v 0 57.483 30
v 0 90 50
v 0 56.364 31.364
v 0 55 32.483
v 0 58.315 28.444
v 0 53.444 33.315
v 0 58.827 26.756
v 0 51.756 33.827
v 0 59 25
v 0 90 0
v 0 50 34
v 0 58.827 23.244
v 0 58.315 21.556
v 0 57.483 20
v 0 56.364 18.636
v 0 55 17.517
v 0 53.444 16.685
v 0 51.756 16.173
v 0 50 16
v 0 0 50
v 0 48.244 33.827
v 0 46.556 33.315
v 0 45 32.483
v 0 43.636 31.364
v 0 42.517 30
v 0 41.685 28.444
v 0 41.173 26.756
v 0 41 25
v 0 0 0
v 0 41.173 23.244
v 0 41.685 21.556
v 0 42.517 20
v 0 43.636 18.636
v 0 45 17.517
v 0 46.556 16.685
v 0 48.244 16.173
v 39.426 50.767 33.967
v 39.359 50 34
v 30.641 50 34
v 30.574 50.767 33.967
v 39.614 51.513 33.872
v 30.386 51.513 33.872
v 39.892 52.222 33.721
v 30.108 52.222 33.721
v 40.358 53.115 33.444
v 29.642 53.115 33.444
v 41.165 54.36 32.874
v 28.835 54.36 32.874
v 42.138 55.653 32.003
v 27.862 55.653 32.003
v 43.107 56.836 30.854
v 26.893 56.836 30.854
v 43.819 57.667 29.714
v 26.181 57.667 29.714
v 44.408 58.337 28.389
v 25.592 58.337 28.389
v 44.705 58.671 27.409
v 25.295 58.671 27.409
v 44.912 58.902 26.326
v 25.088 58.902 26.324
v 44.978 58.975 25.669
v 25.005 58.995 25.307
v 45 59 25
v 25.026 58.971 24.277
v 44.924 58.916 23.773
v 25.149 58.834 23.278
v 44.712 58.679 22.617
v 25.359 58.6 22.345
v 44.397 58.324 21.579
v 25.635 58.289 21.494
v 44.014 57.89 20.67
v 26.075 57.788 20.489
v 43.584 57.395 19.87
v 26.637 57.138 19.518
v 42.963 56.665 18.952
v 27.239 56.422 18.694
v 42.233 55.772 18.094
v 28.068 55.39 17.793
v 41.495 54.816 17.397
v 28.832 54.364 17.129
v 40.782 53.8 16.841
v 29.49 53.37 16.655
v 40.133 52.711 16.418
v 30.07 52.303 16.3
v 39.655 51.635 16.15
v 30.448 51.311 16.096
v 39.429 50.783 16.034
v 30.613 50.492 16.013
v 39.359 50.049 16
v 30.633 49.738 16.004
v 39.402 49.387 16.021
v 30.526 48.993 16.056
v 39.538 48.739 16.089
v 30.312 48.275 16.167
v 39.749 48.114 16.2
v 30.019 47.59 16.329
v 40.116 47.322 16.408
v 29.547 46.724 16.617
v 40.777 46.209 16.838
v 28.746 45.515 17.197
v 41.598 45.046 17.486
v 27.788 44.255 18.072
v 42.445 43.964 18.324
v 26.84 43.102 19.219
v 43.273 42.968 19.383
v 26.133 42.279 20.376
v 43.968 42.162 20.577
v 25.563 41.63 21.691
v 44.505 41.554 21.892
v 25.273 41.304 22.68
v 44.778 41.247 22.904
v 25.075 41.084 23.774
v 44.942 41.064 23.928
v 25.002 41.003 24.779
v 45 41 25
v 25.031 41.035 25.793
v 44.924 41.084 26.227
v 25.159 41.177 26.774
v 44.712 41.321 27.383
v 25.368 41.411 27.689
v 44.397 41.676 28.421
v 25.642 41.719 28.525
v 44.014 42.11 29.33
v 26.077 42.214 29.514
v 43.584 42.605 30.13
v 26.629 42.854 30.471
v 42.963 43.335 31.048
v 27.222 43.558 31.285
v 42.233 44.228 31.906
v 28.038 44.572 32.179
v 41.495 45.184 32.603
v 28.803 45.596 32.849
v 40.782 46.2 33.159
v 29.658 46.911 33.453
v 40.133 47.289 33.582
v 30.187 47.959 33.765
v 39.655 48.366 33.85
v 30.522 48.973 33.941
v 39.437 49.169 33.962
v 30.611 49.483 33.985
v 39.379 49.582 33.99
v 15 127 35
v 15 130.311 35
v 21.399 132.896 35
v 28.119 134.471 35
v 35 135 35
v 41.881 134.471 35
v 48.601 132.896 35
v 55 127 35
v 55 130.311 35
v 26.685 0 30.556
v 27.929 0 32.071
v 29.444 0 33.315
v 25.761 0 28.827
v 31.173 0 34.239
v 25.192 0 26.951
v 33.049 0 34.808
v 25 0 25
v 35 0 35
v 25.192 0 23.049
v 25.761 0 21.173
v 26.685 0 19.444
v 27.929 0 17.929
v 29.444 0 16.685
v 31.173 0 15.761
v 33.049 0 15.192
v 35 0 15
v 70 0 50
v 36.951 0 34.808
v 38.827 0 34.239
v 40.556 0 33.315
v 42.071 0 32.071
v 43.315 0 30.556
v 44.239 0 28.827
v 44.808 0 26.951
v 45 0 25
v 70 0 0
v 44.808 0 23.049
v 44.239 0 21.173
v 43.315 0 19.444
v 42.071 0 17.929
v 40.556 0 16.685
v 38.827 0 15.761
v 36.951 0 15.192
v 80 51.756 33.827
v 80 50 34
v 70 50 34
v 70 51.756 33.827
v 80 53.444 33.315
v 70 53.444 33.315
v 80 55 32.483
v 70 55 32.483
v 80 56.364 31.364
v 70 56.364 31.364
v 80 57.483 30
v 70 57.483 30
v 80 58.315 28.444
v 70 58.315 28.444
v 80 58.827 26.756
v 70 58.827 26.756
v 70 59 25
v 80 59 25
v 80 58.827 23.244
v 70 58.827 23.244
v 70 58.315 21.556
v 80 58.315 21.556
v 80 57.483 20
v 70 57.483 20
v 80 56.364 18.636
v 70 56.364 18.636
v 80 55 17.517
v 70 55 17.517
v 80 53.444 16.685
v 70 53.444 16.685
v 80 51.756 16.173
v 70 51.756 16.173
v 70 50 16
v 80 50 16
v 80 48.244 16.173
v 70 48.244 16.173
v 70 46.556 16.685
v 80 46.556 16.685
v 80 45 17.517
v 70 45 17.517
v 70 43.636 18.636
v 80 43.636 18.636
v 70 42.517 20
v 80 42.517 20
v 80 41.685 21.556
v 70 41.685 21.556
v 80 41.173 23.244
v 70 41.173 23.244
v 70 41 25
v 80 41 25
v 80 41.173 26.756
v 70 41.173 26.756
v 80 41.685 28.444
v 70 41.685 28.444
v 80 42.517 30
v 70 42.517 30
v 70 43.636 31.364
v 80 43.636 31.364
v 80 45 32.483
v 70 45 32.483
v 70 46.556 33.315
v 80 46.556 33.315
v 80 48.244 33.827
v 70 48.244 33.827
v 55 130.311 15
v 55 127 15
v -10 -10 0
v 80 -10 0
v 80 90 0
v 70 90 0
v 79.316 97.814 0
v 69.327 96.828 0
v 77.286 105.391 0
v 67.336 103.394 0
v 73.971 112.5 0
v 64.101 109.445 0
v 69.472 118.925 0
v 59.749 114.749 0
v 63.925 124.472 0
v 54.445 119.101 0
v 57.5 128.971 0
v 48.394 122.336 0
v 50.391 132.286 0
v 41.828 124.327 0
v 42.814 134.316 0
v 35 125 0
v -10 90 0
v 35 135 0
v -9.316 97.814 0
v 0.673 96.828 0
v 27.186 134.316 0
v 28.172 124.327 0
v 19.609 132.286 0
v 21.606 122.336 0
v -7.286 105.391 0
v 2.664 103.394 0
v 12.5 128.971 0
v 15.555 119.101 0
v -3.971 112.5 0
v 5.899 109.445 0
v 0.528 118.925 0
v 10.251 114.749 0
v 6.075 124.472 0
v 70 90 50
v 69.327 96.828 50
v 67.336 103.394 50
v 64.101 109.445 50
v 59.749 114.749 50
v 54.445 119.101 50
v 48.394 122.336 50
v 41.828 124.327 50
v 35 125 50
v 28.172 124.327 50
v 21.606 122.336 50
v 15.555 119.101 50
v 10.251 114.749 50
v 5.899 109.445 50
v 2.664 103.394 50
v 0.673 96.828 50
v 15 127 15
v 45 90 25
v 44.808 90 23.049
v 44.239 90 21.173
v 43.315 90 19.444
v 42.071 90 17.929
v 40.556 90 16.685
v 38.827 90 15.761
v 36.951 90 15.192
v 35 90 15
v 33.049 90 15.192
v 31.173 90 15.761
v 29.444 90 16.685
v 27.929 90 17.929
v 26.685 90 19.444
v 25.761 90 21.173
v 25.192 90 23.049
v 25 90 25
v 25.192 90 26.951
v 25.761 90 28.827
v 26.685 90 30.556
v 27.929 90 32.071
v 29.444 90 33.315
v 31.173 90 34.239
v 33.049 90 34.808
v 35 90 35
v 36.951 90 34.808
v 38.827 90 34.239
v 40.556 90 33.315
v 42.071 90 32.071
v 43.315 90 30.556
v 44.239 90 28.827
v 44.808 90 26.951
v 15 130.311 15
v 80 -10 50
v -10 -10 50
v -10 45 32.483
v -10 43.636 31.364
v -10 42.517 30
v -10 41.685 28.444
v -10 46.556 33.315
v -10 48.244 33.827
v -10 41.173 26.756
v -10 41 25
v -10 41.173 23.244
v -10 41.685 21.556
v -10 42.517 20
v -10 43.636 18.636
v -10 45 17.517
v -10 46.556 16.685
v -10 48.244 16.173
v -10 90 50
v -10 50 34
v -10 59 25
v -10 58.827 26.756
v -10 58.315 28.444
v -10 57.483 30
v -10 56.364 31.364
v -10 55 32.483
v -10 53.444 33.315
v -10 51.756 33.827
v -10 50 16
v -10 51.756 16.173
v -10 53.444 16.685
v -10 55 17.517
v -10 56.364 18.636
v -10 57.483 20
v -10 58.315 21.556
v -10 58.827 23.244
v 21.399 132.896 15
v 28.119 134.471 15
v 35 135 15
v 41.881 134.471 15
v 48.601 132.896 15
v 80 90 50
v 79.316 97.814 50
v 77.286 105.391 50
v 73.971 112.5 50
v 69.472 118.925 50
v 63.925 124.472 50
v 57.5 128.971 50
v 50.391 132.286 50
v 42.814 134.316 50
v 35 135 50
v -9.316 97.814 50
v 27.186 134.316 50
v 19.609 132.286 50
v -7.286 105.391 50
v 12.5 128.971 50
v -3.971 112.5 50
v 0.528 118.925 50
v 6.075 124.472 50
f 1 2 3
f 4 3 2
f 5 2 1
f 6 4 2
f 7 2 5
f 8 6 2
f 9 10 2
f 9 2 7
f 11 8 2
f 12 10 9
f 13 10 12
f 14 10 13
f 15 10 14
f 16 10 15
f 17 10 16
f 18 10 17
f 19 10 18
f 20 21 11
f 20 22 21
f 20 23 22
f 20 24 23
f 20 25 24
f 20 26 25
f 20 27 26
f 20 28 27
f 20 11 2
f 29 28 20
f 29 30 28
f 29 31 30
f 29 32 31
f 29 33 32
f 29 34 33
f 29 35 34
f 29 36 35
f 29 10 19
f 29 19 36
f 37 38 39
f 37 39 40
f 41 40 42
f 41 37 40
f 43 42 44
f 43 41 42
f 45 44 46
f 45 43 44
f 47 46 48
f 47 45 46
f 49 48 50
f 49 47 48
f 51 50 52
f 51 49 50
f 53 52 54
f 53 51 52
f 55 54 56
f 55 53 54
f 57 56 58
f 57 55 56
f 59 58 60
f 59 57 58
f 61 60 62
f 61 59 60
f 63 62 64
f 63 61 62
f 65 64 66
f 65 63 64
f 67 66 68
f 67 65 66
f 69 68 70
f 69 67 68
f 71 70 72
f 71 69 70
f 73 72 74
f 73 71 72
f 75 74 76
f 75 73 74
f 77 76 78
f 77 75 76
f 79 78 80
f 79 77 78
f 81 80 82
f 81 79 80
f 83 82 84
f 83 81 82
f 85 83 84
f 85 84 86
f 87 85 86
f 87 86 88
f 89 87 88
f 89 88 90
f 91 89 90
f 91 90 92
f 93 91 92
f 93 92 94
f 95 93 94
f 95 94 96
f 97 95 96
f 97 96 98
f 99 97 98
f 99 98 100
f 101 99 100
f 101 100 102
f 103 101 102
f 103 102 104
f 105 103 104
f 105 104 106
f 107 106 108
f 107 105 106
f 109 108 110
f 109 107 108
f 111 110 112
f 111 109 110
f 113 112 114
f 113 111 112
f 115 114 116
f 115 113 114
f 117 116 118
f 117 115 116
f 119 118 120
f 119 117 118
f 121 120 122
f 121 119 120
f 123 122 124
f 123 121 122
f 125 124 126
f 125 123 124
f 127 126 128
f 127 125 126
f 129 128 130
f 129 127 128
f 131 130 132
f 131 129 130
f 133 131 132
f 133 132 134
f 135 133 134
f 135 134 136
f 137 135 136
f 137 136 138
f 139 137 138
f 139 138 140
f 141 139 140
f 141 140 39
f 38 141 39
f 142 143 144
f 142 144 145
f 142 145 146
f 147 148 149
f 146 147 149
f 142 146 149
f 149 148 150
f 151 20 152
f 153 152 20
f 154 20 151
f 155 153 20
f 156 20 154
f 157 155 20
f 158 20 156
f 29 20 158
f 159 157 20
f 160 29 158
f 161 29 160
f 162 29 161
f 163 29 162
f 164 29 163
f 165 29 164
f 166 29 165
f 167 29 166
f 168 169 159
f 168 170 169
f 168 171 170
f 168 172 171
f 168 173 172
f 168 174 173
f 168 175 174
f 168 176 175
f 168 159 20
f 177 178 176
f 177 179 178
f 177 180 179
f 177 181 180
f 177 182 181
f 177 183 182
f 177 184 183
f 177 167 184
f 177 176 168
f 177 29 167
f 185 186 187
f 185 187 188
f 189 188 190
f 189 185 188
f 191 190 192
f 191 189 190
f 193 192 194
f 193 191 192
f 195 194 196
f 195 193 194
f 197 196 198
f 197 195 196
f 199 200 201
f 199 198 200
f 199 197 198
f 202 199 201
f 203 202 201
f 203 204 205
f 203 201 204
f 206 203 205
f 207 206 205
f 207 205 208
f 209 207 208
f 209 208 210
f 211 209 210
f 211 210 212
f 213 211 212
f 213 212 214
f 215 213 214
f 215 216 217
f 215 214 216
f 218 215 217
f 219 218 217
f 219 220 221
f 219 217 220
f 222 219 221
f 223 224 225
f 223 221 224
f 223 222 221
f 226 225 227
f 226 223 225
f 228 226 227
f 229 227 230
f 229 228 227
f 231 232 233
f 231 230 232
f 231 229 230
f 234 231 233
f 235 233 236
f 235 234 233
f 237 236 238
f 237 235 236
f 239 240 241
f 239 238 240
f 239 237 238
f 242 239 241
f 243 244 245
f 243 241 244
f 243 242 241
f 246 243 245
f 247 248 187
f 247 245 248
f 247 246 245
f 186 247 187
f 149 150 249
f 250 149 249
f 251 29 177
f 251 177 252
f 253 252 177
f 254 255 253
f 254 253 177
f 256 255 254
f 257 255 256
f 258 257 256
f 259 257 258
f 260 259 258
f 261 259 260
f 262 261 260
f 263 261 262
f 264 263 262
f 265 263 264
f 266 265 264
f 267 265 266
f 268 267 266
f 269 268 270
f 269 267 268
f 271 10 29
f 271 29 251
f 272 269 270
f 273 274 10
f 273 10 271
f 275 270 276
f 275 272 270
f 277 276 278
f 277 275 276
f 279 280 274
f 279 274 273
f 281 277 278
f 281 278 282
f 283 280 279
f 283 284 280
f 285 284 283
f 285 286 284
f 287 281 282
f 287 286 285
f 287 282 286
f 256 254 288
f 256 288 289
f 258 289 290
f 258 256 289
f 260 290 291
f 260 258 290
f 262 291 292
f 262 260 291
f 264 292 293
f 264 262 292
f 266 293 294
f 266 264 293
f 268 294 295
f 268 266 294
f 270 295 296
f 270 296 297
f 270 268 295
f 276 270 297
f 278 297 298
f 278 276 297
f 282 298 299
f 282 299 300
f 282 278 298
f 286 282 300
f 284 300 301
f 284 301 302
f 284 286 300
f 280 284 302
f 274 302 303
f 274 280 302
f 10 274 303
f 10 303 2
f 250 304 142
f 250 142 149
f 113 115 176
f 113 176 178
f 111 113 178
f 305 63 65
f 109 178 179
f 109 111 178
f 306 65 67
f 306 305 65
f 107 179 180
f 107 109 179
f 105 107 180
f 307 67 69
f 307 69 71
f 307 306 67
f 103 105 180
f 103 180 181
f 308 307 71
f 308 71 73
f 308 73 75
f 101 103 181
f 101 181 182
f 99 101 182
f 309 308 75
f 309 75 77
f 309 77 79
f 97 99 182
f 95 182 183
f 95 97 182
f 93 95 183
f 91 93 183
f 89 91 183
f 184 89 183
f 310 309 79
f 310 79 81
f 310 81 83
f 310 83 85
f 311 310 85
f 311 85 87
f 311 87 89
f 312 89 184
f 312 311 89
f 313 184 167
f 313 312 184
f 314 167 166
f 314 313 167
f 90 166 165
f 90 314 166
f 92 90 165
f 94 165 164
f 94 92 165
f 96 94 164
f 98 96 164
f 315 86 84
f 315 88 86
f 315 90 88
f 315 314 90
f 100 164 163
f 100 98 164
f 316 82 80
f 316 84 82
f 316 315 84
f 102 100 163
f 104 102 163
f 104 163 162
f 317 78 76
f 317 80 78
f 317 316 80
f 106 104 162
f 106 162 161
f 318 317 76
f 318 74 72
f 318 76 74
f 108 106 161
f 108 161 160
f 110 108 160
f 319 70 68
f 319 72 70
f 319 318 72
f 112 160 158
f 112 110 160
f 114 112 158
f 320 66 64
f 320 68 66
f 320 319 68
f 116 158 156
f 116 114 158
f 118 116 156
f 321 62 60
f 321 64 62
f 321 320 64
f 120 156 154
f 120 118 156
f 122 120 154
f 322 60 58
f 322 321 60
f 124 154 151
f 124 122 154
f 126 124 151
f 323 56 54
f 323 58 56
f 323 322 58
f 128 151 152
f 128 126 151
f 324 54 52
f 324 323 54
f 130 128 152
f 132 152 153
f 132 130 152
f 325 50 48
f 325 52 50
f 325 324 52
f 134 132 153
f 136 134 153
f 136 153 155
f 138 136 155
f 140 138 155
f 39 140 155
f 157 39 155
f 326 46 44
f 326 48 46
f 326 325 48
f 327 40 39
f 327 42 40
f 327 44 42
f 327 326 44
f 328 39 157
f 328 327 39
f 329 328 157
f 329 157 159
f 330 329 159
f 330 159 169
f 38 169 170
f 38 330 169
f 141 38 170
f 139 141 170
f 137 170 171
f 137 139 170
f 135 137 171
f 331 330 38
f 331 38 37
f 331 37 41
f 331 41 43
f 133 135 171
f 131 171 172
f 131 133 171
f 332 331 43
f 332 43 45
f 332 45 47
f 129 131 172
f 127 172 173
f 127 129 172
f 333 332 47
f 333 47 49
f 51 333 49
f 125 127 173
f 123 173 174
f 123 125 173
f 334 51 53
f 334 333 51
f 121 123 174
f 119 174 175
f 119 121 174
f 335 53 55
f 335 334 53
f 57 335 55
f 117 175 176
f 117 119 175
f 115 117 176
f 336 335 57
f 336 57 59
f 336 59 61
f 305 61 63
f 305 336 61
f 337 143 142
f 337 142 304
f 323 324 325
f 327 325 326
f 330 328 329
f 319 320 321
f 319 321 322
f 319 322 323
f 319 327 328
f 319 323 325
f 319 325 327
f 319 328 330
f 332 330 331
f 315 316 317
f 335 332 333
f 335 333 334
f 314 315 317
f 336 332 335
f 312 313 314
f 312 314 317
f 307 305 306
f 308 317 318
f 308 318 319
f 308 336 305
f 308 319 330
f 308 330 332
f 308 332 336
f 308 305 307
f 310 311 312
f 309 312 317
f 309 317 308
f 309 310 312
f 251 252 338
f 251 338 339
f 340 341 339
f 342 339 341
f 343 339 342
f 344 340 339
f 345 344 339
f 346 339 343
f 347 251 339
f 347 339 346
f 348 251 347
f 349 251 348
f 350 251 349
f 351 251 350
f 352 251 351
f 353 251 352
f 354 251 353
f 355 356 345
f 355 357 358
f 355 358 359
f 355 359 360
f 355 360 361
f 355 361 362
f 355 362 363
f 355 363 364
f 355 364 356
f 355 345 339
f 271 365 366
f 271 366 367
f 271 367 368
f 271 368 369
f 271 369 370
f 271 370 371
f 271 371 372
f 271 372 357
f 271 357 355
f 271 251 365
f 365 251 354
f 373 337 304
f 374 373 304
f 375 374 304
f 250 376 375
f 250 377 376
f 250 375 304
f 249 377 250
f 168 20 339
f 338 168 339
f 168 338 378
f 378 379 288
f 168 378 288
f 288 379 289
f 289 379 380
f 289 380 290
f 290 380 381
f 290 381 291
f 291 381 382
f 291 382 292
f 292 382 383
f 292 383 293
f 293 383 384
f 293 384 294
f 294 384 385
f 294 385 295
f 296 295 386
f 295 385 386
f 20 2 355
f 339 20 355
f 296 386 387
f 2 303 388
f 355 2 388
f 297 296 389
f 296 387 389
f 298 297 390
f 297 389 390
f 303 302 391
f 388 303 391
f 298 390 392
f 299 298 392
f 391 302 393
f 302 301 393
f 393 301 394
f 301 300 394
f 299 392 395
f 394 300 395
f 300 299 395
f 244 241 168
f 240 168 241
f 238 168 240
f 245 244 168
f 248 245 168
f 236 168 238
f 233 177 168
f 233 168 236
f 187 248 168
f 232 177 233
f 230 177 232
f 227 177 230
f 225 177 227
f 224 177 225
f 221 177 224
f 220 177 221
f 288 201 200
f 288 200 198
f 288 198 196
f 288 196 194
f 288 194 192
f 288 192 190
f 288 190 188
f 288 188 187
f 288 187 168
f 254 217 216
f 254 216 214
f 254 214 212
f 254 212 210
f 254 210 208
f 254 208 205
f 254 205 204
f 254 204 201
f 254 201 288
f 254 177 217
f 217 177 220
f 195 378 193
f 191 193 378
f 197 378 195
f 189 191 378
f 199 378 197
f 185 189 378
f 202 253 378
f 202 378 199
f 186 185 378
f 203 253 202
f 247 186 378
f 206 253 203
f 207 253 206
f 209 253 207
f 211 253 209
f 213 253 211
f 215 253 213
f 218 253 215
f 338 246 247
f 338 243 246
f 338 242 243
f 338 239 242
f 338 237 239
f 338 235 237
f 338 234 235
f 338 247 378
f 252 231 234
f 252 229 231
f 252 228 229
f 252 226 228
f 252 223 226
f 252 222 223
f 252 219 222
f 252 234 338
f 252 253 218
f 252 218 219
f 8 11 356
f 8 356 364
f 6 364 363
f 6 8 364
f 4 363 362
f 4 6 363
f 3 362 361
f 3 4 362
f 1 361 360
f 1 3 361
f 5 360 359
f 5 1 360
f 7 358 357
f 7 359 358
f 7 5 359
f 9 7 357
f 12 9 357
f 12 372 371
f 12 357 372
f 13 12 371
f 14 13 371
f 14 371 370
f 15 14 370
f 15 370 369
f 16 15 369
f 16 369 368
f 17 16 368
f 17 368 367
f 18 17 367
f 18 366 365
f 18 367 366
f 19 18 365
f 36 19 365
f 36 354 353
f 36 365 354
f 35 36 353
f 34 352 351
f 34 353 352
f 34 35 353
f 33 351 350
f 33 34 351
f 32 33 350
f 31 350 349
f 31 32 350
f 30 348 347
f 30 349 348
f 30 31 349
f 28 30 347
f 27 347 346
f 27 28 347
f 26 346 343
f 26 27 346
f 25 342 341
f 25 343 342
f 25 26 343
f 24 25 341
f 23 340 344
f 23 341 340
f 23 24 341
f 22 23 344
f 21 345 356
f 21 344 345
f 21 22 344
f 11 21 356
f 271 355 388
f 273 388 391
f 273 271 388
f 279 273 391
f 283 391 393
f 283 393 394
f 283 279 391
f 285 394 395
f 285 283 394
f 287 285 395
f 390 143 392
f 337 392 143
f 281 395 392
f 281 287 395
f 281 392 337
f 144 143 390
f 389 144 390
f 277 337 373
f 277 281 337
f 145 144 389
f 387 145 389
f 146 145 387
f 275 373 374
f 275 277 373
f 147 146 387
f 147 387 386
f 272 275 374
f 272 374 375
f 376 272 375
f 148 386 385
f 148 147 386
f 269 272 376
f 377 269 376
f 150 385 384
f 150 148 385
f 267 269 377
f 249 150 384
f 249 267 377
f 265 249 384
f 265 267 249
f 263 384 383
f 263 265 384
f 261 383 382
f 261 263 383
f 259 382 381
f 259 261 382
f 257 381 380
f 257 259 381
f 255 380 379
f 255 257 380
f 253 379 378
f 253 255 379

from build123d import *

# Parameters (mm, degrees)
BOSS_EXTRUDE1_DEPTH     = 50
SKETCH3_W               = 40
SKETCH3_H               = 20
CUT_EXTRUDE1_DEPTH      = 8
BOSS_EXTRUDE2_REACH     = 102
SKETCH4_R               = 10
SKETCH6_R               = 9
CUT_EXTRUDE2_DEPTH      = 141
CUT_EXTRUDE2_DEPTH_BACK = 1


with BuildPart() as part:
    # Sketch1 → Boss-Extrude1 (new body)
    with BuildSketch(Plane.XY):
        with BuildLine():
            Line((80, 90), (80, -10))
            Line((80, -10), (-10, -10))
            Line((-10, -10), (-10, 90))
            ThreePointArc((-10, 90), (35, 135), (80, 90))
        make_face()
        with BuildLine():
            Line((0, 90), (0, 0))
            Line((0, 0), (70, 0))
            Line((70, 0), (70, 90))
            ThreePointArc((70, 90), (35, 125), (0, 90))
        make_face(mode=Mode.SUBTRACT)
    extrude(amount=BOSS_EXTRUDE1_DEPTH)

    # Sketch3 → Cut-Extrude1 (cut)
    with BuildSketch(Plane(origin=(0, 135, 0), x_dir=(1, 0, 0), z_dir=(0, 1, 0))):
        with Locations((35, -25)):
            Rectangle(SKETCH3_W, SKETCH3_H)
    extrude(amount=-CUT_EXTRUDE1_DEPTH, mode=Mode.SUBTRACT)

    # Sketch4 → Boss-Extrude2 (add, up to next)
    with BuildSketch(Plane(origin=(0, 90, 0), x_dir=(1, 0, 0), z_dir=(0, 1, 0)), mode=Mode.PRIVATE) as boss_extrude2_sk1:
        with Locations((35, -25)):
            Circle(SKETCH4_R)
    boss_extrude2_tool1 = extrude(boss_extrude2_sk1.sketch, amount=-BOSS_EXTRUDE2_REACH, mode=Mode.PRIVATE) - part.part
    add(boss_extrude2_tool1.solids().sort_by_distance((35, 90, 25))[0])

    # Sketch6 → Cut-Extrude2 (cut, two sides)
    with BuildSketch(Plane.ZY.offset(-130)) as cut_extrude2_sk:
        with Locations((25, 50)):
            Circle(SKETCH6_R)
    extrude(amount=CUT_EXTRUDE2_DEPTH, mode=Mode.SUBTRACT)
    extrude(cut_extrude2_sk.sketch, amount=-CUT_EXTRUDE2_DEPTH_BACK, mode=Mode.SUBTRACT)


solid = part.part
